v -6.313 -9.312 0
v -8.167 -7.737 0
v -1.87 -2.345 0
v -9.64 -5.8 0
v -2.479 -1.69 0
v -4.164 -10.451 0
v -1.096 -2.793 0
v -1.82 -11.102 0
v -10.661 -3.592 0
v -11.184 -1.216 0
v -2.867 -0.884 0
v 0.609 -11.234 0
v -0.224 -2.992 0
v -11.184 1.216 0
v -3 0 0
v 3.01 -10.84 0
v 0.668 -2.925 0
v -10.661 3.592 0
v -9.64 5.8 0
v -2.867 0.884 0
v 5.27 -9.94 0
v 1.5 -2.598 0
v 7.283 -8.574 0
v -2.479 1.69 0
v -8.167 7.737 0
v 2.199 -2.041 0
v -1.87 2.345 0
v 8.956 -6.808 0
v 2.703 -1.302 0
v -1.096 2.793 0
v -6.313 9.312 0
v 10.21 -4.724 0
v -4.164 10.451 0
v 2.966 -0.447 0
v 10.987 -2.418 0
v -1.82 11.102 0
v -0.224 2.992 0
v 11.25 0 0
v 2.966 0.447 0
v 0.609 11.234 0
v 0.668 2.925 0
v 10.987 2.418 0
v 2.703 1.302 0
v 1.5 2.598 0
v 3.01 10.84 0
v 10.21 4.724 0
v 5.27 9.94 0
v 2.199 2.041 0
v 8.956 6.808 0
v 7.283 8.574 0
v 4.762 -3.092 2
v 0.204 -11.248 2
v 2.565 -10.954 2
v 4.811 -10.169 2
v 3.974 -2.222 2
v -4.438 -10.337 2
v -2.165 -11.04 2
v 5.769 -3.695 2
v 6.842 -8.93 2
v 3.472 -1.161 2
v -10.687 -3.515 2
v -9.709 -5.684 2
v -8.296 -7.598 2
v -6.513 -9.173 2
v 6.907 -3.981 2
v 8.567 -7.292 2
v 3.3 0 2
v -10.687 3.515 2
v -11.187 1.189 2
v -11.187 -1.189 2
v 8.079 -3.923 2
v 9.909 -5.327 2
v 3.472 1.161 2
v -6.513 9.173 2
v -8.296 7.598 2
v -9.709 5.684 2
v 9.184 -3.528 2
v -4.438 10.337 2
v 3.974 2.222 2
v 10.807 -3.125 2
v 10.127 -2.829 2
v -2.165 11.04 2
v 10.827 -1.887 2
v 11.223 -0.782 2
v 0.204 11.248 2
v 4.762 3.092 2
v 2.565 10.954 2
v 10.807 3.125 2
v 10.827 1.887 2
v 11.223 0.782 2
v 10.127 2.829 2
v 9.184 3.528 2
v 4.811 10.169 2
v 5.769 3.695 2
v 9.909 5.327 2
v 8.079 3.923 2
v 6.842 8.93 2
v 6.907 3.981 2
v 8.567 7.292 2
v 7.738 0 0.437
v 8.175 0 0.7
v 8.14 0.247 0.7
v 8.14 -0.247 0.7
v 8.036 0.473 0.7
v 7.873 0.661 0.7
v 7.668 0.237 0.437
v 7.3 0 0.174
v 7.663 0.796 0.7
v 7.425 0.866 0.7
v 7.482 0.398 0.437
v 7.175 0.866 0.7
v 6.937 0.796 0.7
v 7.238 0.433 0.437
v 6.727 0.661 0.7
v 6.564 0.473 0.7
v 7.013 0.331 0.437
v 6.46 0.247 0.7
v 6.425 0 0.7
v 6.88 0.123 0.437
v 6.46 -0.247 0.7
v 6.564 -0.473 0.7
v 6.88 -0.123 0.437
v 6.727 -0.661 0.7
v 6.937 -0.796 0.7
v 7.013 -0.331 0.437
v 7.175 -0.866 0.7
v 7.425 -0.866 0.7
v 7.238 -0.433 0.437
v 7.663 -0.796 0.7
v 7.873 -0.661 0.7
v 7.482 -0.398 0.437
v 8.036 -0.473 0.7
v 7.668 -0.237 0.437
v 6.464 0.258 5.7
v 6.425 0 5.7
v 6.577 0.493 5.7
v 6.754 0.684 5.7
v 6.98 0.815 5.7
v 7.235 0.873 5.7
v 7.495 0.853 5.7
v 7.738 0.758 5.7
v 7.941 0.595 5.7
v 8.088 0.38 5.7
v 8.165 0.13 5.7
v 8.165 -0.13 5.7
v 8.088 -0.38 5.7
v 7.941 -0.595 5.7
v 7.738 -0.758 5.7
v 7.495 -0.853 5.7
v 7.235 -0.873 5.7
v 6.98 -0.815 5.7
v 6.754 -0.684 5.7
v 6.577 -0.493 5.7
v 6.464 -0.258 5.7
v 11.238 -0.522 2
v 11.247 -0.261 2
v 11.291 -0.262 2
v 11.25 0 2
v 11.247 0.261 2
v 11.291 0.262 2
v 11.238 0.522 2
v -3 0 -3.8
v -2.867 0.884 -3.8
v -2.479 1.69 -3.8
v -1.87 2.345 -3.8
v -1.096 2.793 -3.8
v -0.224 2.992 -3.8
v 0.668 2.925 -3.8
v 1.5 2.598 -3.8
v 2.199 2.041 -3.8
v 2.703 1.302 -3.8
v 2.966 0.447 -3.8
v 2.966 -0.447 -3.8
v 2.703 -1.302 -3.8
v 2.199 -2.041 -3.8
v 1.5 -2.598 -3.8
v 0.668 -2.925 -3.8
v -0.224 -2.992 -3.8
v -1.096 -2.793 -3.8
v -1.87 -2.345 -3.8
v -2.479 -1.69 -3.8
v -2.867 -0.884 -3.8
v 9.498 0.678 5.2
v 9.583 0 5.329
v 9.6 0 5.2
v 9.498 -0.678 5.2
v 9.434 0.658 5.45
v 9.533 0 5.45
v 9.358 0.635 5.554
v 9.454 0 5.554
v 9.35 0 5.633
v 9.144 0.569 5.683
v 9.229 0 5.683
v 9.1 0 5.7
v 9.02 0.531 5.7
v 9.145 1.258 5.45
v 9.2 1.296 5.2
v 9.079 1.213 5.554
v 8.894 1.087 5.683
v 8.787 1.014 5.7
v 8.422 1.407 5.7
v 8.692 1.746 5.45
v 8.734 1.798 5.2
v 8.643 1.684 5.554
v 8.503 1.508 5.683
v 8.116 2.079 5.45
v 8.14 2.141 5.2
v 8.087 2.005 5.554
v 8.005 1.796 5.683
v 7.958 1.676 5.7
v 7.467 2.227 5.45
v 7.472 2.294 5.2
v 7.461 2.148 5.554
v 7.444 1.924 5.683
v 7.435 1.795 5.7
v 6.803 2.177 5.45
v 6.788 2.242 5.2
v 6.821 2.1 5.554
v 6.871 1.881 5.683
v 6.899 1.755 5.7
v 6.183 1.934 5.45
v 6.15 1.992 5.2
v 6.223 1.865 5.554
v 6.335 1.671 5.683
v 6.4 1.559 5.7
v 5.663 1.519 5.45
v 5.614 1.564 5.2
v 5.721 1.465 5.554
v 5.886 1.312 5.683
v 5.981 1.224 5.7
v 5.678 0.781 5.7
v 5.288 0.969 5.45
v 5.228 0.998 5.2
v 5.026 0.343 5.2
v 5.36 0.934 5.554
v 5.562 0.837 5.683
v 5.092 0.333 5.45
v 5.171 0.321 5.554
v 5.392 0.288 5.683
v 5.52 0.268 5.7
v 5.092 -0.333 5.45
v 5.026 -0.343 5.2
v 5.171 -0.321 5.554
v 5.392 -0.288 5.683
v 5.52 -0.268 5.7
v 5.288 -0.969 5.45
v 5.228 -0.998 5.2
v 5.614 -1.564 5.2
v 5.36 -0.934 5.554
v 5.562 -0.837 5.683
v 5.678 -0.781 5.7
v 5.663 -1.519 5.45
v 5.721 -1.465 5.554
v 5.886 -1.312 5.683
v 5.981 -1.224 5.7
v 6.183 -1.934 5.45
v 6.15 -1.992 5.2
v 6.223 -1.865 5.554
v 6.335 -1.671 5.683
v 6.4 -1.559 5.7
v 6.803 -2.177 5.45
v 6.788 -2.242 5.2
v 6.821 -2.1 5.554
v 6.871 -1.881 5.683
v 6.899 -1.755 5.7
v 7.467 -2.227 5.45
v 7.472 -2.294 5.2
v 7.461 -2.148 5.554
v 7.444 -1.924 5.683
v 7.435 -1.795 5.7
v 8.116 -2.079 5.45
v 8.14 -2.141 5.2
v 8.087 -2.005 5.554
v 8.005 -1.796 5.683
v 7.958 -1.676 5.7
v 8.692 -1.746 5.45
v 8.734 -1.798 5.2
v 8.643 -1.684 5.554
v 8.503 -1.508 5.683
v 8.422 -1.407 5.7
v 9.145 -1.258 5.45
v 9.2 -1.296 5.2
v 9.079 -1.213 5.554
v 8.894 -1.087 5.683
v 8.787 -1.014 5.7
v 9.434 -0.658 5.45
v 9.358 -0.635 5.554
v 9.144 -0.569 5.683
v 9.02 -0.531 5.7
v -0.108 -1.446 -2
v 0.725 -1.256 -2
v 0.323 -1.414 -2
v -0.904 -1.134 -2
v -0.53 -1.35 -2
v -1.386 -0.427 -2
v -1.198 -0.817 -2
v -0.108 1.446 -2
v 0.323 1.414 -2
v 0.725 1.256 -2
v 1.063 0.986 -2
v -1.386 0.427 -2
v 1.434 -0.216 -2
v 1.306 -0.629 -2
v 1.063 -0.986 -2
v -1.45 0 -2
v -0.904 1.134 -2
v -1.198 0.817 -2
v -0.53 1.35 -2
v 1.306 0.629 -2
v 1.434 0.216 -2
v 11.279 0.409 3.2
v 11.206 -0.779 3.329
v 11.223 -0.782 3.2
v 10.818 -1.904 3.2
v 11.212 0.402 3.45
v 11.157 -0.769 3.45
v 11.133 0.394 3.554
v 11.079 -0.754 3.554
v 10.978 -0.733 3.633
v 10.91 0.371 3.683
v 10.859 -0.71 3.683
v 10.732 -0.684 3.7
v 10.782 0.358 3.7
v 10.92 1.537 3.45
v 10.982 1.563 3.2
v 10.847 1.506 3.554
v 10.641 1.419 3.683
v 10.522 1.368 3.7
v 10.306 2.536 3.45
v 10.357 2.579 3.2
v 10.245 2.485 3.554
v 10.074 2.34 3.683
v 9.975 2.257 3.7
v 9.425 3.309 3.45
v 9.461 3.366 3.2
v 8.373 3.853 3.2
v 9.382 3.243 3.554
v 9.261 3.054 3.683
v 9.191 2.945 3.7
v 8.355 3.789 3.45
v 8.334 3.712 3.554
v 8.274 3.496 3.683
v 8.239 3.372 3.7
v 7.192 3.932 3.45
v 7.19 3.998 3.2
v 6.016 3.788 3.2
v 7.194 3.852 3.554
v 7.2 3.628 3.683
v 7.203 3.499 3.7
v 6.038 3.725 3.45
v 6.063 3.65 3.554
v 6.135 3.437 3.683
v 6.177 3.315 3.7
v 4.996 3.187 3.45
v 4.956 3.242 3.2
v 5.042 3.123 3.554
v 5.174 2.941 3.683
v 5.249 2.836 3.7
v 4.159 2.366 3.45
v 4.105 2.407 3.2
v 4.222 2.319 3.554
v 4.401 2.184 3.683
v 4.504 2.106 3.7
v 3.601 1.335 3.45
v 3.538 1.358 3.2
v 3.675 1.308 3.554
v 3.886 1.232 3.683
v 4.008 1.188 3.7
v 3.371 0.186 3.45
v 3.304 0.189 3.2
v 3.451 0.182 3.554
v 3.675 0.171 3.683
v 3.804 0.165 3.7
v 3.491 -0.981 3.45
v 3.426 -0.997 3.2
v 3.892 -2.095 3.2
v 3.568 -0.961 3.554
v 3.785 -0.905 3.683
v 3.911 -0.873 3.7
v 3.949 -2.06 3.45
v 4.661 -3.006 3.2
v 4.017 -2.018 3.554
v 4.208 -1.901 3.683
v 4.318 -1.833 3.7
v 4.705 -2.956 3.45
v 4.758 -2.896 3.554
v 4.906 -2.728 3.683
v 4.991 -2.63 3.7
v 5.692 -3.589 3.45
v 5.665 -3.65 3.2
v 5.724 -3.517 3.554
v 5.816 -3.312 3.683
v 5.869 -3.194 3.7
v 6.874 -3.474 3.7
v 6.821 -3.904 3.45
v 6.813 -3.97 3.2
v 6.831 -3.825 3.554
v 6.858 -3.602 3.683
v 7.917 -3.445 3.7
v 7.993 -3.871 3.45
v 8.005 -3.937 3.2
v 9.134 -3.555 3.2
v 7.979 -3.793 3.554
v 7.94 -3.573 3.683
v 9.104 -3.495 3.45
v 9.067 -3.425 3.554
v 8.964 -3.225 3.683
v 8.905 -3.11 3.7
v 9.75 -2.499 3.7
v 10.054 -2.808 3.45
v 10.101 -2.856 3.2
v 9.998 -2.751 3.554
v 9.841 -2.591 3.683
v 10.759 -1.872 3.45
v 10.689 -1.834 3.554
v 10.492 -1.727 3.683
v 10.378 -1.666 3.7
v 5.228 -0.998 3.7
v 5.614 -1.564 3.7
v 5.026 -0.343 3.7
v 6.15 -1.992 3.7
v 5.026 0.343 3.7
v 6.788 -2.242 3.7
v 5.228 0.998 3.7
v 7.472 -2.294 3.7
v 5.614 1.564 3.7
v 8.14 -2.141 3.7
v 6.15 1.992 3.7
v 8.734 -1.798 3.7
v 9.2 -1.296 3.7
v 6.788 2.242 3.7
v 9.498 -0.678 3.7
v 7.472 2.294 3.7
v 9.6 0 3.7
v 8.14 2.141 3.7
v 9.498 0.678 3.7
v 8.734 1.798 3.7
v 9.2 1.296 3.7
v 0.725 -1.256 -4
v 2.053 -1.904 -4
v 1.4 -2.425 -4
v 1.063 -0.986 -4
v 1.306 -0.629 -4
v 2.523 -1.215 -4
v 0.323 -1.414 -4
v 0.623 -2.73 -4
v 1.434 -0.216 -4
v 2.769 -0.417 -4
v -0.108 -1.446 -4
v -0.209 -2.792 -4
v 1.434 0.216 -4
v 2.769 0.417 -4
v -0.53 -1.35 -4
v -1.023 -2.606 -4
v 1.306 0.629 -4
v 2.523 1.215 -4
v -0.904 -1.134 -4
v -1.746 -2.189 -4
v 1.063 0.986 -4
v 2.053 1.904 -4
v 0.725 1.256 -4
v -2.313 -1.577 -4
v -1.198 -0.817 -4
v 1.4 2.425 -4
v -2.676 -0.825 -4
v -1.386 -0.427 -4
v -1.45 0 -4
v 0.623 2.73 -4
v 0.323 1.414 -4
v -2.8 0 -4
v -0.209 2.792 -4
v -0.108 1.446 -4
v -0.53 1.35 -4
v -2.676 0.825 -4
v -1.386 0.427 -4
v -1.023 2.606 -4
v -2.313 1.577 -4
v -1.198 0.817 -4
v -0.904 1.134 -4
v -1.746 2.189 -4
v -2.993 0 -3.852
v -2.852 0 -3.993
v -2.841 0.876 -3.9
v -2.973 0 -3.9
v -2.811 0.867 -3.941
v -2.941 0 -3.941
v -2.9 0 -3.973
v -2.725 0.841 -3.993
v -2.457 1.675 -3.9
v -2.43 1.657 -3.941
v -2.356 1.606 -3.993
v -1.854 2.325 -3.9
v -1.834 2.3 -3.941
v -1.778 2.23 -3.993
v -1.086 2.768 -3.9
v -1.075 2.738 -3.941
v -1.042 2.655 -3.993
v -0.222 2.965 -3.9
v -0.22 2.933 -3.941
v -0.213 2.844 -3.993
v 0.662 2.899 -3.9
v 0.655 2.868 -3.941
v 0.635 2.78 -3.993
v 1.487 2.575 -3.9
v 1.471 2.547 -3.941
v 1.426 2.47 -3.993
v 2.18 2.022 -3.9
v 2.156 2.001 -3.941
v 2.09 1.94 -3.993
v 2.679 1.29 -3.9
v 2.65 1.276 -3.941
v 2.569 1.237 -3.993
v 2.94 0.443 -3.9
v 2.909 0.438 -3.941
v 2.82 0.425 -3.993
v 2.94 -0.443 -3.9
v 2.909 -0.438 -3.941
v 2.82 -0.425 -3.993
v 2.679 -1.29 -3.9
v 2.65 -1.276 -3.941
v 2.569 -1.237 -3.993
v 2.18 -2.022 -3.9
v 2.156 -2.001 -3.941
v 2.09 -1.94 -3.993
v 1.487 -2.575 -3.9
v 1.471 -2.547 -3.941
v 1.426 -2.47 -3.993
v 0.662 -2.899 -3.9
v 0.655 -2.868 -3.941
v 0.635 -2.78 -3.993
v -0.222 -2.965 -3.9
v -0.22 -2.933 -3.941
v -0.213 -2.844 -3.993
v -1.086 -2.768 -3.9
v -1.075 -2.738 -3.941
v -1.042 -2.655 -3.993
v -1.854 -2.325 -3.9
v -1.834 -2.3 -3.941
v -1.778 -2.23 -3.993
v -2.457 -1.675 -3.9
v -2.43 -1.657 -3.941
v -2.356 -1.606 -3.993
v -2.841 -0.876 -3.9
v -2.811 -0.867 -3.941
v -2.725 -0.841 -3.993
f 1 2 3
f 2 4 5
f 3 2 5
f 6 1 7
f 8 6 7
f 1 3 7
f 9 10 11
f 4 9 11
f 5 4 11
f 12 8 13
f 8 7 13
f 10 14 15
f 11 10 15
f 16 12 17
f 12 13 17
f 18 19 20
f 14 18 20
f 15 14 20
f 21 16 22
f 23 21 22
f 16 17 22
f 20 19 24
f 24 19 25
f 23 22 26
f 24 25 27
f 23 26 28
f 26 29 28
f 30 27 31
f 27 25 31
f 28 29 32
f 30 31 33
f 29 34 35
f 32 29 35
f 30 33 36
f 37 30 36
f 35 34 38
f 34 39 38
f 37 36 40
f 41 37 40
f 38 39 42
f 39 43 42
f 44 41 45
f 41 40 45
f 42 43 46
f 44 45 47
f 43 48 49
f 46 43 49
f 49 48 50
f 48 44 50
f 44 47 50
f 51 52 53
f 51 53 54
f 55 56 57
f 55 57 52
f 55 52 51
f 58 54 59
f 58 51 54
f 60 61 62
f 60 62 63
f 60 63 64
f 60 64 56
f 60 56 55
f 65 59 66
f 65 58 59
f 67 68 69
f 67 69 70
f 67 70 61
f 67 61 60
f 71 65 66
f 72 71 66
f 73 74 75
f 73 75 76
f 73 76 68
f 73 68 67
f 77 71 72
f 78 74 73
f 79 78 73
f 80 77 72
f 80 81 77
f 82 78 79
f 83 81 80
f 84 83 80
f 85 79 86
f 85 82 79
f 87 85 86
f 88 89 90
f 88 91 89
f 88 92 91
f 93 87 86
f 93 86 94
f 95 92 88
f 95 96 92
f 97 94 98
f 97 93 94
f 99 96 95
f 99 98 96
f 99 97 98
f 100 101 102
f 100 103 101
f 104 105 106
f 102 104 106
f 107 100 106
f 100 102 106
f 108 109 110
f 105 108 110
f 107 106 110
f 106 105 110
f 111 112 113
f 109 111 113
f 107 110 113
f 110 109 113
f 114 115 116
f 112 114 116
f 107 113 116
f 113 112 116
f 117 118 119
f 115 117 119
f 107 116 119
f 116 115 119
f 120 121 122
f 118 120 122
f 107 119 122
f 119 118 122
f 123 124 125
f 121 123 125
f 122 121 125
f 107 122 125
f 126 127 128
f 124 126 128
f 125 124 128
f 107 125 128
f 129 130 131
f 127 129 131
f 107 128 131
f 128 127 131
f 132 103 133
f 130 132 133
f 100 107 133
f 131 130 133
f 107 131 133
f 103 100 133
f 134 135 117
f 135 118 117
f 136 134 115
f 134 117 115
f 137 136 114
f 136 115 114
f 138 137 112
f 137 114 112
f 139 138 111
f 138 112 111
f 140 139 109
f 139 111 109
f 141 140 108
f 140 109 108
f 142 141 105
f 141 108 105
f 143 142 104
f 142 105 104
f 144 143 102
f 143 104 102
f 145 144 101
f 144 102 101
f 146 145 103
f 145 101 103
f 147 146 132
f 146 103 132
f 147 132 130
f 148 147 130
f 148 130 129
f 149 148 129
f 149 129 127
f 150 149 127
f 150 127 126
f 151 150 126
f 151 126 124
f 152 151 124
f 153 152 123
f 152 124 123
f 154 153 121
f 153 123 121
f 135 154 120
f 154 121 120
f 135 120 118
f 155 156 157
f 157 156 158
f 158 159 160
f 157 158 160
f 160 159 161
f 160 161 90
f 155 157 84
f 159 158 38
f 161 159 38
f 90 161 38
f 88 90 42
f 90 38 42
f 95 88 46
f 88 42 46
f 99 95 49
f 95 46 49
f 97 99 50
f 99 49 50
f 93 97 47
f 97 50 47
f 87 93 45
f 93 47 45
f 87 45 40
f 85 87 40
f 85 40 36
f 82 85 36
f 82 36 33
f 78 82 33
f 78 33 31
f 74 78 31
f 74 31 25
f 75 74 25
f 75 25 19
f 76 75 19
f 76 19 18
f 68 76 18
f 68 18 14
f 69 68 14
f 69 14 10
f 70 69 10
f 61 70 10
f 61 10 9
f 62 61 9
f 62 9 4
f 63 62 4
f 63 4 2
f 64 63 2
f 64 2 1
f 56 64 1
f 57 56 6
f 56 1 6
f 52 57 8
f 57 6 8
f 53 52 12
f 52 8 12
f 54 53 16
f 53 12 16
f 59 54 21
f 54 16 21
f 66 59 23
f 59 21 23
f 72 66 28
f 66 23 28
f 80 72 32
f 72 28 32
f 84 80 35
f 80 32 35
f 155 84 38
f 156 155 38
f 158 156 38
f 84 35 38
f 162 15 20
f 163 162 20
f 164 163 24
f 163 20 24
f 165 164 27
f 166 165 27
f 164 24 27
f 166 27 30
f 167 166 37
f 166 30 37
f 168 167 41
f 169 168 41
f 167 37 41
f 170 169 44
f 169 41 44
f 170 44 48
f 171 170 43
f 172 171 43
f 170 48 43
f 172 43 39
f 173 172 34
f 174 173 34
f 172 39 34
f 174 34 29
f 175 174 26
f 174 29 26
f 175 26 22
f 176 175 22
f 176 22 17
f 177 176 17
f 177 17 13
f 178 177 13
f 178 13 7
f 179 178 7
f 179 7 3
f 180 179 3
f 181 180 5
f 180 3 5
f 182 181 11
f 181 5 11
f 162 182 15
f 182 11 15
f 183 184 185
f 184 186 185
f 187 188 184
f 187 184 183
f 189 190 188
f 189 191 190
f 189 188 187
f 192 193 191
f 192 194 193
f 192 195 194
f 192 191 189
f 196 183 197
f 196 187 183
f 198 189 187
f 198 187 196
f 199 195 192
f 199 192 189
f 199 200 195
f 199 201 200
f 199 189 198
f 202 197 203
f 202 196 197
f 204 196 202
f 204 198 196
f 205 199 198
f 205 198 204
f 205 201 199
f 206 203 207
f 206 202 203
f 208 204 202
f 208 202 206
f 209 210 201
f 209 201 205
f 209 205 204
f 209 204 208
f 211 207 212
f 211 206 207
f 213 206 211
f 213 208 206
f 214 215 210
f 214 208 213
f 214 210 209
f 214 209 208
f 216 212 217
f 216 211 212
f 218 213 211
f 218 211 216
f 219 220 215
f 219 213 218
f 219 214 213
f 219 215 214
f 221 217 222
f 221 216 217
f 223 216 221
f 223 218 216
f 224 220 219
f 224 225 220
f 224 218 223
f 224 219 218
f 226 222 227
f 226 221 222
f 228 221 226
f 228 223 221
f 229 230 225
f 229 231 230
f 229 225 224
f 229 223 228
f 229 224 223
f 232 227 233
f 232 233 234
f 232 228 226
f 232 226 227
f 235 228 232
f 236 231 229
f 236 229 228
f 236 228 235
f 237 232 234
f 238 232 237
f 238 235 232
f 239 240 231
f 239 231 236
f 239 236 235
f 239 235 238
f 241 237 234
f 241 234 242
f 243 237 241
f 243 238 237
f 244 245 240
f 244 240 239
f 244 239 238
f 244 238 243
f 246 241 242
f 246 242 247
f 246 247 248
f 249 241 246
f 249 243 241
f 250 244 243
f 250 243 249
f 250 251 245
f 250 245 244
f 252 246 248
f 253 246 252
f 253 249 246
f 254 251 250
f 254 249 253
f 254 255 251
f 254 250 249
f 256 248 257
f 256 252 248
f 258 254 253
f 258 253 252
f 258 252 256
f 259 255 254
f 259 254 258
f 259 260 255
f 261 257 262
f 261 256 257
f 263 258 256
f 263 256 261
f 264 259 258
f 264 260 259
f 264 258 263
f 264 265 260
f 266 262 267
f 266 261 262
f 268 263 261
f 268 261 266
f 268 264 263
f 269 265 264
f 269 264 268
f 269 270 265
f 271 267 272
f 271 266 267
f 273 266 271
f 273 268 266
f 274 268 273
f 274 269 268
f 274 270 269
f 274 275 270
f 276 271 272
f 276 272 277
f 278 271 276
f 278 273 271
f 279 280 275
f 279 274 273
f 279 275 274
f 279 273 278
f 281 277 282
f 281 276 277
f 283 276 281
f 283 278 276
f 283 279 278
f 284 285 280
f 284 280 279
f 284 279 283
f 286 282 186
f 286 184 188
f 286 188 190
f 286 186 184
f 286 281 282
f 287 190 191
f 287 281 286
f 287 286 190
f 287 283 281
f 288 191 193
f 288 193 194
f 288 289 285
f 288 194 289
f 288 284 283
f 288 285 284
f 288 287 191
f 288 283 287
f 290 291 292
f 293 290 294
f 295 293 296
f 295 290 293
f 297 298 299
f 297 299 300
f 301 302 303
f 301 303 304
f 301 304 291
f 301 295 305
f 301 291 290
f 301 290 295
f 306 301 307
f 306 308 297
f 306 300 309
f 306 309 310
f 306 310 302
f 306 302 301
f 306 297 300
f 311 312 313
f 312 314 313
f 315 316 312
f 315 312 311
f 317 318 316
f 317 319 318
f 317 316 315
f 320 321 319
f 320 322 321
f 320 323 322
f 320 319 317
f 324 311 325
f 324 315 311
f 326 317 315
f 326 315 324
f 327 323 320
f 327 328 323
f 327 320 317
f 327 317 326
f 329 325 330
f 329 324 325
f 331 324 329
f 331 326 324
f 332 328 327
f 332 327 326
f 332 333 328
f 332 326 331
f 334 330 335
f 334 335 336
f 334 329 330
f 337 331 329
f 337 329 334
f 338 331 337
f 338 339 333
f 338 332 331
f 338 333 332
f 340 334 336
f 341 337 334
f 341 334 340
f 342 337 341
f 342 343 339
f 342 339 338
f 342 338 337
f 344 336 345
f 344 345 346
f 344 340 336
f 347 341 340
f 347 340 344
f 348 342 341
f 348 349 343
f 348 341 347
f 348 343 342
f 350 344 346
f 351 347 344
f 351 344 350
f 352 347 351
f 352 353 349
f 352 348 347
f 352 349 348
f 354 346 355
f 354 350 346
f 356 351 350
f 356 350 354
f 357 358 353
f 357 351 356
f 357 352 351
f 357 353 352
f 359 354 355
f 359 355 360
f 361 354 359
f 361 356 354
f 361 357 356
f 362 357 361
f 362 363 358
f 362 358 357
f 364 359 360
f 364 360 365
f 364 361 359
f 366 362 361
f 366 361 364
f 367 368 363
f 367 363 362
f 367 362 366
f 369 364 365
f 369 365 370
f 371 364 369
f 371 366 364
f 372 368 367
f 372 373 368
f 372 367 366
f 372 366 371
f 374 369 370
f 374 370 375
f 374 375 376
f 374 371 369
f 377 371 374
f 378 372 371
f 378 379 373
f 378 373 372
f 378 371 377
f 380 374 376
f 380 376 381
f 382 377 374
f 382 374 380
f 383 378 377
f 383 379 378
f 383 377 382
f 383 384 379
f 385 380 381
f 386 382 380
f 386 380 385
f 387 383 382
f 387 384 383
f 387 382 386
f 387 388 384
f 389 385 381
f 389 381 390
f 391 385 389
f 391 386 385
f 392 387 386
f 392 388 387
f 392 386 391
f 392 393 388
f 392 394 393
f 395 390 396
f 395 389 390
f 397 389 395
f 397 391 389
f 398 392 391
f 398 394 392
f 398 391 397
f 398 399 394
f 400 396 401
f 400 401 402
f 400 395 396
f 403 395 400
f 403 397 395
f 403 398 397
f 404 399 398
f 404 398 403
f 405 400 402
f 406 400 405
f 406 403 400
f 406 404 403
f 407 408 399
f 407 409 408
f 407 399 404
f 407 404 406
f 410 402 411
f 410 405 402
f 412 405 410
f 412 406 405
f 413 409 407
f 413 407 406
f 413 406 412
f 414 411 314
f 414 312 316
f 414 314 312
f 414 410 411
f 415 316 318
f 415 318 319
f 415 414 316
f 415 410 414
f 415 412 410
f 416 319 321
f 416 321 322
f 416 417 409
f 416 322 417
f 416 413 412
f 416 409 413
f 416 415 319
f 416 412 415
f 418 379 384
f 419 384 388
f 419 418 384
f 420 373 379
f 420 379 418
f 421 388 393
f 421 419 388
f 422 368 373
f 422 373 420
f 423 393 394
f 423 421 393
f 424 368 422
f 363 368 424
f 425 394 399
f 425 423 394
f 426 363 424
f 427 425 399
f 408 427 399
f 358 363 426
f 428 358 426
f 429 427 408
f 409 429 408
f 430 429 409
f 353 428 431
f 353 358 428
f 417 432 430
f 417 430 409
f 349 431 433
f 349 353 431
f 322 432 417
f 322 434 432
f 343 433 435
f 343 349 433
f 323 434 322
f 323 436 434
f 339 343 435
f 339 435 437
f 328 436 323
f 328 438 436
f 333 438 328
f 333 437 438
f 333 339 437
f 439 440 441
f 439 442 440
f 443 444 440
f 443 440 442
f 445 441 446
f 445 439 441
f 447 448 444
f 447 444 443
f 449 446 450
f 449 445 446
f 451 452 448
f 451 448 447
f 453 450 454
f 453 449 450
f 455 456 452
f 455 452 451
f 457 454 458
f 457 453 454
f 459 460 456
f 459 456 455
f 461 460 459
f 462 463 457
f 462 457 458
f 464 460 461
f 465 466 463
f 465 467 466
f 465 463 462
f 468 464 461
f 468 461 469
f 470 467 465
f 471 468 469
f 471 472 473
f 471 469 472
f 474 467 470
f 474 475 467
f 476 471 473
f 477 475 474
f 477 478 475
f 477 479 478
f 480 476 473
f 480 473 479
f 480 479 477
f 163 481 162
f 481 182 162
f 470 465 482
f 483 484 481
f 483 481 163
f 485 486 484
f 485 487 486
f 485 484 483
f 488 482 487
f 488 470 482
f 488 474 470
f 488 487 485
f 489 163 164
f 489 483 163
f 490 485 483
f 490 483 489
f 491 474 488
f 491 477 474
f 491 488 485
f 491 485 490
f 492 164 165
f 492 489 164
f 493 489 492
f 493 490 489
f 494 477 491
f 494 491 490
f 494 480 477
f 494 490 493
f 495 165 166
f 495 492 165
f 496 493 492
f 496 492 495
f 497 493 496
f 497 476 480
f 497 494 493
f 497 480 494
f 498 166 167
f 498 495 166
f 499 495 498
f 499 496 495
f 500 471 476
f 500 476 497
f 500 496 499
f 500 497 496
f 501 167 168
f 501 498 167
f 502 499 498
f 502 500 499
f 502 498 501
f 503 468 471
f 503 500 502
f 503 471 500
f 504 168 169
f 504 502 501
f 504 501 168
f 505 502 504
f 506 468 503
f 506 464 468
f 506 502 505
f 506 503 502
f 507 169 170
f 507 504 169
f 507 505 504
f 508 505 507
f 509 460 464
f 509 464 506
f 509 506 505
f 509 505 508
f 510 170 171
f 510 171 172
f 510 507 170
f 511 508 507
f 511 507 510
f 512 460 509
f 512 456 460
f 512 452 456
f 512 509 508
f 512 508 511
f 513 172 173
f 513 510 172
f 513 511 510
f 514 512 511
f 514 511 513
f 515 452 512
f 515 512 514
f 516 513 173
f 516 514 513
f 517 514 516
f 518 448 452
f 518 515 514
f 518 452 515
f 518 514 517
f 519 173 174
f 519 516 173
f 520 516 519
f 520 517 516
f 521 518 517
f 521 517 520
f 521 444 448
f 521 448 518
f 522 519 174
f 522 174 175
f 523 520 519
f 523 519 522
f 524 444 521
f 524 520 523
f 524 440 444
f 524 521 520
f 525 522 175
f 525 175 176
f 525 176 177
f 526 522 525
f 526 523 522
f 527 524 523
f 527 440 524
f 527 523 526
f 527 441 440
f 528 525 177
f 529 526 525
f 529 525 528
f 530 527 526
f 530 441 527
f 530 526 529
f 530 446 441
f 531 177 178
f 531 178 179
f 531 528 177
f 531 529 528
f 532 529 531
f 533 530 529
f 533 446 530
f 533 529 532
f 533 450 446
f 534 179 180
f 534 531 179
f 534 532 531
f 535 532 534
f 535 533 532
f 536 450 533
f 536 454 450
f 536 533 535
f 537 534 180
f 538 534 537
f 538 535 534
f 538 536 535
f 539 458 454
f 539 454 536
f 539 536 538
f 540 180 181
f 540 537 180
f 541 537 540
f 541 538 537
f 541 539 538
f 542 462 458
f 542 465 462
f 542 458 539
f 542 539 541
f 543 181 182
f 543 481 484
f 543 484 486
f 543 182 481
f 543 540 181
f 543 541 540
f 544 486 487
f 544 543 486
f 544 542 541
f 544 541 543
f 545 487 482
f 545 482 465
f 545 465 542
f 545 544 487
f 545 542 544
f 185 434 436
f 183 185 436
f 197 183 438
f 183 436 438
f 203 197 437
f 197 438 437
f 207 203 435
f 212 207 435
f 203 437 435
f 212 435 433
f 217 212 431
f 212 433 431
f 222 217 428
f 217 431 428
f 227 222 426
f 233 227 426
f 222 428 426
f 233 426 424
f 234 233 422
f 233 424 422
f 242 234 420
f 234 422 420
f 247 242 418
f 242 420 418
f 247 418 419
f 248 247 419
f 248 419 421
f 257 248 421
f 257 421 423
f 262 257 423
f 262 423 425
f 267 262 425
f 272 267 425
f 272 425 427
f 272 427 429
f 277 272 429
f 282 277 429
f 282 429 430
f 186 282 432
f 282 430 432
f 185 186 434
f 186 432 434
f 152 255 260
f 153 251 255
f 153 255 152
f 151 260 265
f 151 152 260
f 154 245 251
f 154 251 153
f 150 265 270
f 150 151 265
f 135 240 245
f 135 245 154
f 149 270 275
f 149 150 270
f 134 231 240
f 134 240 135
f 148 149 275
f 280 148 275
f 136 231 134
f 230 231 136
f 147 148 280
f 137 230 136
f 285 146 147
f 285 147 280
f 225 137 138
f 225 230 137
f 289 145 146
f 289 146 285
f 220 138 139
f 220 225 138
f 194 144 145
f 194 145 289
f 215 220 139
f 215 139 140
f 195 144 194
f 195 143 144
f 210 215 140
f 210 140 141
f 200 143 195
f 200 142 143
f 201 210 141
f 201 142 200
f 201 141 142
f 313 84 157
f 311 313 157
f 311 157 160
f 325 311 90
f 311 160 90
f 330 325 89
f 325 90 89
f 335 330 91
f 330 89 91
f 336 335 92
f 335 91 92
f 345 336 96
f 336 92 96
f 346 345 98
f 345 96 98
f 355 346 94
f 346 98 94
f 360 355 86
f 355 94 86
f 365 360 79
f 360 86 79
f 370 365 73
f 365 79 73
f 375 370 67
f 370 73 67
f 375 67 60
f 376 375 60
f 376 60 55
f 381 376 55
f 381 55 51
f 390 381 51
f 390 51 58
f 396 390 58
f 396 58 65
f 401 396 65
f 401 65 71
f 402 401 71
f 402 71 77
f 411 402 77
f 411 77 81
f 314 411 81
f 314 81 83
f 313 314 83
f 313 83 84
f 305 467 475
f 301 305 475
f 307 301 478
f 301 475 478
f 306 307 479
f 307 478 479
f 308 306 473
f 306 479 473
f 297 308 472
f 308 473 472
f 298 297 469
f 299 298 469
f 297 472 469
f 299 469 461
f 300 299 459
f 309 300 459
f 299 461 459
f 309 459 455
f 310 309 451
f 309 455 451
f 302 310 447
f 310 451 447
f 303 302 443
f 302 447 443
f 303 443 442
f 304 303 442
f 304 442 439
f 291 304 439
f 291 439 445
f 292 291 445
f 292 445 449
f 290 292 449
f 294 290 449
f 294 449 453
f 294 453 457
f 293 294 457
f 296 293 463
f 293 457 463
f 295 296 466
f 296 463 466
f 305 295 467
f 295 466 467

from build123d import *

# Parameters (mm, degrees)
ESQUISSE1_R                  = 11.25
BOSS_EXTRU_1_DEPTH           = 2
ESQUISSE2_R                  = 4
BOSS_EXTRU_2_DEPTH           = 1.7
ESQUISSE3_R                  = 2.3
BOSS_EXTRU_3_DEPTH           = 2
CONG_1_R                     = 0.5
ESQUISSE4_R                  = 3
BOSS_EXTRU_4_DEPTH           = 4
ESQUISSE5_R                  = 1.45
ENL_V_MAT_EXTRU_1_DEPTH      = 2
TROU_TARAUD_M2_2X0_451_D     = 1.75
TROU_TARAUD_M2_2X0_451_DEPTH = 5
TROU_TARAUD_M2_2X0_451_TIP   = 0.525753042
CONG_2_R                     = 0.2


with BuildPart() as part:
    # Esquisse1 → Boss.-Extru.1 (new body)
    with BuildSketch(Plane.XY):
        Circle(ESQUISSE1_R)
    extrude(amount=BOSS_EXTRU_1_DEPTH)

    # Esquisse2 → Boss.-Extru.2 (add)
    with BuildSketch(Plane.XY.offset(2)):
        with Locations(Location((7.3, 0, 0), (0, 0, 348.723074946))):
            Circle(ESQUISSE2_R)
    extrude(amount=BOSS_EXTRU_2_DEPTH)

    # Esquisse3 → Boss.-Extru.3 (add)
    with BuildSketch(Plane.XY.offset(3.7)):
        with Locations((7.3, 0)):
            Circle(ESQUISSE3_R)
    extrude(amount=BOSS_EXTRU_3_DEPTH)

    # Congé1
    cong_1_edges = [part.edges().sort_by_distance(p)[0] for p in [
        (5, 0, 5.7),
        (3.377226027, 0.782204807, 3.7),
    ]]
    fillet(cong_1_edges, radius=CONG_1_R)

    # Esquisse4 → Boss.-Extru.4 (add)
    with BuildSketch(Plane(origin=(0, 0, 0), x_dir=(-1, 0, 0), z_dir=(0, 0, -1))):
        Circle(ESQUISSE4_R)
    extrude(amount=BOSS_EXTRU_4_DEPTH)

    # Esquisse5 → Enlèv. mat.-Extru.1 (cut)
    with BuildSketch(Plane(origin=(0, 0, -4), x_dir=(-1, 0, 0), z_dir=(0, 0, -1))):
        Circle(ESQUISSE5_R)
    extrude(amount=-ENL_V_MAT_EXTRU_1_DEPTH, mode=Mode.SUBTRACT)

    # Trou taraudé M2.2x0.451
    with Locations(Plane.XY.offset(5.7)):
        with Locations((7.3, 0)):
            Hole(TROU_TARAUD_M2_2X0_451_D / 2, depth=TROU_TARAUD_M2_2X0_451_DEPTH)
            with Locations((0, 0, -(TROU_TARAUD_M2_2X0_451_DEPTH + TROU_TARAUD_M2_2X0_451_TIP / 2))):  # 118° drill point
                Cone(0, TROU_TARAUD_M2_2X0_451_D / 2, TROU_TARAUD_M2_2X0_451_TIP, mode=Mode.SUBTRACT)

    # Congé2
    cong_2_edges = [part.edges().sort_by_distance(p)[0] for p in [
        (3, 0, -4),
    ]]
    fillet(cong_2_edges, radius=CONG_2_R)


solid = part.part
